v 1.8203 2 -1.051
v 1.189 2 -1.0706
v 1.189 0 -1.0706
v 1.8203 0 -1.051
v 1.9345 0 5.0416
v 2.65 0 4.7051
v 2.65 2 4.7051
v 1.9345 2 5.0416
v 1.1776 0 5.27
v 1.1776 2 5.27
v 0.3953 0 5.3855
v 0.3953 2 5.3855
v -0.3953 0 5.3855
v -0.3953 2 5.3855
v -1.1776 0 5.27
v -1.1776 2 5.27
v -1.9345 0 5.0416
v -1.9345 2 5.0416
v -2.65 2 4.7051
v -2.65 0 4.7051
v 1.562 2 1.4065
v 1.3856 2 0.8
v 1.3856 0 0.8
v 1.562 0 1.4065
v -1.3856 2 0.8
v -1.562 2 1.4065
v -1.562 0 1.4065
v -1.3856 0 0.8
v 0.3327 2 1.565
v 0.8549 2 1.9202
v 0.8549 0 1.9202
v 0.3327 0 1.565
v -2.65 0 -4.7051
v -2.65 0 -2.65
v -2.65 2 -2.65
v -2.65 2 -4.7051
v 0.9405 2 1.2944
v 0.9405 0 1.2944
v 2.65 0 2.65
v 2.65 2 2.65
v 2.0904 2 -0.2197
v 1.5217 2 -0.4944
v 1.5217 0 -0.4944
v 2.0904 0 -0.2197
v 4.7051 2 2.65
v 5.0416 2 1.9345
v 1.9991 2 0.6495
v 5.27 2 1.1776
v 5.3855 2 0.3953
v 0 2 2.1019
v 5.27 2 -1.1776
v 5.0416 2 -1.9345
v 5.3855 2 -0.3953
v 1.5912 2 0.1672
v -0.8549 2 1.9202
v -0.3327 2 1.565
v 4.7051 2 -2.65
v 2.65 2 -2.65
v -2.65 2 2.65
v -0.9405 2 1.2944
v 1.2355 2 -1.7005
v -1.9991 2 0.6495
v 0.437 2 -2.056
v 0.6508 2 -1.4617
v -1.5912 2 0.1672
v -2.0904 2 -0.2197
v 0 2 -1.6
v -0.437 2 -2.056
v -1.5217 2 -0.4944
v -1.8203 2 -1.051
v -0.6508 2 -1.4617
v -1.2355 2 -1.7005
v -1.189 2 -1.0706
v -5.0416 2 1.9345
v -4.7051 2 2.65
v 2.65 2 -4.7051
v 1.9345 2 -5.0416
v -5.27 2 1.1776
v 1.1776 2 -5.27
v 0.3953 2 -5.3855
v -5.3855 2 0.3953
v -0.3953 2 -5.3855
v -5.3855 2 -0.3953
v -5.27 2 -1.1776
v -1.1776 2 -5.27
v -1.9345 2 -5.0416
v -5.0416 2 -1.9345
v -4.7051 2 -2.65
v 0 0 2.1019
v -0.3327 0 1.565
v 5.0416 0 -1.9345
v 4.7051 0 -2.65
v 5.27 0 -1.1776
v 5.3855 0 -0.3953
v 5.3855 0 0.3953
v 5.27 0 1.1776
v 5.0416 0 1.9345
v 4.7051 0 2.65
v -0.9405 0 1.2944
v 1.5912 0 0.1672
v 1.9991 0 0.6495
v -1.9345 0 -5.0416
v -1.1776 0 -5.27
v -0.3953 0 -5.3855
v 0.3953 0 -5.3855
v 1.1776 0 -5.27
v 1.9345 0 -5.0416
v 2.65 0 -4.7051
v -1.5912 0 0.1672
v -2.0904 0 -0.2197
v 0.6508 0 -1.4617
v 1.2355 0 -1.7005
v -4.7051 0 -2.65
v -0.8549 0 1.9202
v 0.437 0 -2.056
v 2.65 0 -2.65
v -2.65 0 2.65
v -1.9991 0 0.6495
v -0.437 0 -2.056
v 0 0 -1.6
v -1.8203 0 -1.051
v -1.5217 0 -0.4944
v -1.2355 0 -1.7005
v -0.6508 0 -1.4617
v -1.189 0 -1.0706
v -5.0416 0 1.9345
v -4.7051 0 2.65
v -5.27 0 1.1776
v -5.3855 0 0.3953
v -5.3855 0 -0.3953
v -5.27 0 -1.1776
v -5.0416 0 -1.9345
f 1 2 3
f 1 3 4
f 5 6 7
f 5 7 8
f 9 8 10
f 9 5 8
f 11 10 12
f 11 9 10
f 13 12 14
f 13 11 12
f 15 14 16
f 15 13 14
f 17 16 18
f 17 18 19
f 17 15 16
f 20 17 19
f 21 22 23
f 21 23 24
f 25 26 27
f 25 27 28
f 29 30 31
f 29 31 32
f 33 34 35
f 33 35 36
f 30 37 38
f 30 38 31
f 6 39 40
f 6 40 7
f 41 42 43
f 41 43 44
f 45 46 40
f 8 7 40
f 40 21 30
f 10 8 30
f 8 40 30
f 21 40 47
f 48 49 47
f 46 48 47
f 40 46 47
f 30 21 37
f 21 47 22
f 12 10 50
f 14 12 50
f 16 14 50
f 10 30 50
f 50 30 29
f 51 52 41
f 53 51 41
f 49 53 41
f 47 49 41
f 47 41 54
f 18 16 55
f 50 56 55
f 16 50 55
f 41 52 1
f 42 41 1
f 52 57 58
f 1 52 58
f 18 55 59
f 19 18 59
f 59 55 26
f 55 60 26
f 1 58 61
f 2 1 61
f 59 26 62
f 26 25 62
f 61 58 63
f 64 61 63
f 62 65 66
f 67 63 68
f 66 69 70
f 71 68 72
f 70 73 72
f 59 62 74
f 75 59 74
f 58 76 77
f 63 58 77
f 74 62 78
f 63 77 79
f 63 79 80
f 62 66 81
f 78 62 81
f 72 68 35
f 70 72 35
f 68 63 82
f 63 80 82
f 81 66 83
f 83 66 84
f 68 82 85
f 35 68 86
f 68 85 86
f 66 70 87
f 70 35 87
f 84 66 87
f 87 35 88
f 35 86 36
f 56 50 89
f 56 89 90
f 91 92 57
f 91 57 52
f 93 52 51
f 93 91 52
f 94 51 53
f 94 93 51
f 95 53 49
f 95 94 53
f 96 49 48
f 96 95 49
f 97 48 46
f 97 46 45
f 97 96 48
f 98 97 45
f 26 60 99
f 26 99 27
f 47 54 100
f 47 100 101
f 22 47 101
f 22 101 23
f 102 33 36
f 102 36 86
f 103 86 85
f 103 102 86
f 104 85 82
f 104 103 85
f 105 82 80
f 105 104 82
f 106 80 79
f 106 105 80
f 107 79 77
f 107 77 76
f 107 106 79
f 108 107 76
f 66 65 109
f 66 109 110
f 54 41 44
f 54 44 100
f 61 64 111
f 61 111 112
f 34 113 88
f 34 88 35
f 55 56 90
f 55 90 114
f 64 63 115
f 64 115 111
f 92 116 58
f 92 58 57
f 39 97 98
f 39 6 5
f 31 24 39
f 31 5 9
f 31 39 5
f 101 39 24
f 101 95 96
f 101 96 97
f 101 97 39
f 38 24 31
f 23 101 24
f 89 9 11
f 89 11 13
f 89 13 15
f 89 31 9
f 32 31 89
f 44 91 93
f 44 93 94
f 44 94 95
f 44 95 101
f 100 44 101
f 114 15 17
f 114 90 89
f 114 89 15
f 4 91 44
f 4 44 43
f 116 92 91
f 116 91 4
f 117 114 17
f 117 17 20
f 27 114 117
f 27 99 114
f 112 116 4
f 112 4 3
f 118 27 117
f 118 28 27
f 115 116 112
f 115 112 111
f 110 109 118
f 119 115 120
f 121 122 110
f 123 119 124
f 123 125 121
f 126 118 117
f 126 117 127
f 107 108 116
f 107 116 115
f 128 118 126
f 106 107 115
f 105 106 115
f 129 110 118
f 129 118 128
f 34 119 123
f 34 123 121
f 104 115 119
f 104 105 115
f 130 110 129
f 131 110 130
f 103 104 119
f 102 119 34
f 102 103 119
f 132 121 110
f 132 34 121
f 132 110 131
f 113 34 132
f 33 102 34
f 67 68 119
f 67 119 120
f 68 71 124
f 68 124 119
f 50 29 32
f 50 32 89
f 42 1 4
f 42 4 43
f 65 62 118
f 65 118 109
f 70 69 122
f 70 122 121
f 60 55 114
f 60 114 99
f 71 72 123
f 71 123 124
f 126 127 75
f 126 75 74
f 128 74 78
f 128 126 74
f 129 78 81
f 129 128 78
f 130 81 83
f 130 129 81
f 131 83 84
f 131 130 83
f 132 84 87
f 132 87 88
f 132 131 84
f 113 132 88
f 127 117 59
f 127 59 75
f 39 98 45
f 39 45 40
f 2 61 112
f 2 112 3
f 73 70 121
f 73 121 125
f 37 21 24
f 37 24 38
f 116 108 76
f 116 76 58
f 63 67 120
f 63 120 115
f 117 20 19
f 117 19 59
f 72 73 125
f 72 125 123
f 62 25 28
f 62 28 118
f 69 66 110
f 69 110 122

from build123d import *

# Parameters (mm, degrees)
EXTRUDE_1_DEPTH     = 2
CUT_EXTRUDE_2_DEPTH = 2.2


with BuildPart() as part:
    # ｽｹｯﾁ1 → ﾎﾞｽ - 押し出し1 (new body)
    with BuildSketch(Plane(origin=(0, 0, 0), x_dir=(1, 0, 0), z_dir=(0, 1, 0))):
        with BuildLine():
            Line((2.65, 4.705050478), (2.65, 2.65))
            Line((2.65, 2.65), (4.705050478, 2.65))
            ThreePointArc((4.705050478, 2.65), (5.4, 0), (4.705050478, -2.65))
            Line((4.705050478, -2.65), (2.65, -2.65))
            Line((2.65, -2.65), (2.65, -4.705050478))
            ThreePointArc((2.65, -4.705050478), (0, -5.4), (-2.65, -4.705050478))
            Line((-2.65, -4.705050478), (-2.65, -2.65))
            Line((-2.65, -2.65), (-4.705050478, -2.65))
            ThreePointArc((-4.705050478, -2.65), (-5.4, 0), (-4.705050478, 2.65))
            Line((-4.705050478, 2.65), (-2.65, 2.65))
            Line((-2.65, 2.65), (-2.65, 4.705050478))
            ThreePointArc((-2.65, 4.705050478), (0, 5.4), (2.65, 4.705050478))
        make_face()
    extrude(amount=EXTRUDE_1_DEPTH)

    # ｽｹｯﾁ4 → ｶｯﾄ - 押し出し2 (cut)
    with BuildSketch(Plane(origin=(0, 2, 0), x_dir=(1, 0, 0), z_dir=(0, 1, 0))):
        Polygon((0, 1.6), (0.437016815, 2.056002469), (0.650778629, 1.461672732), (1.235486269, 1.700500964), (1.189031721, 1.07060897), (1.820328922, 1.050967393), (1.521690426, 0.494427191), (2.090420168, 0.219712013), (1.591235033, -0.167245541), (1.999058776, -0.64953357), (1.385640646, -0.8), (1.56204196, -1.406468898), (0.940456404, -1.294427191), (0.854933899, -1.920212977), (0.332658705, -1.565036161), (0, -2.101934787), (-0.332658705, -1.565036161), (-0.854933899, -1.920212977), (-0.940456404, -1.294427191), (-1.56204196, -1.406468898), (-1.385640646, -0.8), (-1.999058776, -0.64953357), (-1.591235033, -0.167245541), (-2.090420168, 0.219712013), (-1.521690426, 0.494427191), (-1.820328922, 1.050967393), (-1.189031721, 1.07060897), (-1.235486269, 1.700500964), (-0.650778629, 1.461672732), (-0.437016815, 2.056002469), align=None)
    extrude(amount=-CUT_EXTRUDE_2_DEPTH, mode=Mode.SUBTRACT)


solid = part.part
